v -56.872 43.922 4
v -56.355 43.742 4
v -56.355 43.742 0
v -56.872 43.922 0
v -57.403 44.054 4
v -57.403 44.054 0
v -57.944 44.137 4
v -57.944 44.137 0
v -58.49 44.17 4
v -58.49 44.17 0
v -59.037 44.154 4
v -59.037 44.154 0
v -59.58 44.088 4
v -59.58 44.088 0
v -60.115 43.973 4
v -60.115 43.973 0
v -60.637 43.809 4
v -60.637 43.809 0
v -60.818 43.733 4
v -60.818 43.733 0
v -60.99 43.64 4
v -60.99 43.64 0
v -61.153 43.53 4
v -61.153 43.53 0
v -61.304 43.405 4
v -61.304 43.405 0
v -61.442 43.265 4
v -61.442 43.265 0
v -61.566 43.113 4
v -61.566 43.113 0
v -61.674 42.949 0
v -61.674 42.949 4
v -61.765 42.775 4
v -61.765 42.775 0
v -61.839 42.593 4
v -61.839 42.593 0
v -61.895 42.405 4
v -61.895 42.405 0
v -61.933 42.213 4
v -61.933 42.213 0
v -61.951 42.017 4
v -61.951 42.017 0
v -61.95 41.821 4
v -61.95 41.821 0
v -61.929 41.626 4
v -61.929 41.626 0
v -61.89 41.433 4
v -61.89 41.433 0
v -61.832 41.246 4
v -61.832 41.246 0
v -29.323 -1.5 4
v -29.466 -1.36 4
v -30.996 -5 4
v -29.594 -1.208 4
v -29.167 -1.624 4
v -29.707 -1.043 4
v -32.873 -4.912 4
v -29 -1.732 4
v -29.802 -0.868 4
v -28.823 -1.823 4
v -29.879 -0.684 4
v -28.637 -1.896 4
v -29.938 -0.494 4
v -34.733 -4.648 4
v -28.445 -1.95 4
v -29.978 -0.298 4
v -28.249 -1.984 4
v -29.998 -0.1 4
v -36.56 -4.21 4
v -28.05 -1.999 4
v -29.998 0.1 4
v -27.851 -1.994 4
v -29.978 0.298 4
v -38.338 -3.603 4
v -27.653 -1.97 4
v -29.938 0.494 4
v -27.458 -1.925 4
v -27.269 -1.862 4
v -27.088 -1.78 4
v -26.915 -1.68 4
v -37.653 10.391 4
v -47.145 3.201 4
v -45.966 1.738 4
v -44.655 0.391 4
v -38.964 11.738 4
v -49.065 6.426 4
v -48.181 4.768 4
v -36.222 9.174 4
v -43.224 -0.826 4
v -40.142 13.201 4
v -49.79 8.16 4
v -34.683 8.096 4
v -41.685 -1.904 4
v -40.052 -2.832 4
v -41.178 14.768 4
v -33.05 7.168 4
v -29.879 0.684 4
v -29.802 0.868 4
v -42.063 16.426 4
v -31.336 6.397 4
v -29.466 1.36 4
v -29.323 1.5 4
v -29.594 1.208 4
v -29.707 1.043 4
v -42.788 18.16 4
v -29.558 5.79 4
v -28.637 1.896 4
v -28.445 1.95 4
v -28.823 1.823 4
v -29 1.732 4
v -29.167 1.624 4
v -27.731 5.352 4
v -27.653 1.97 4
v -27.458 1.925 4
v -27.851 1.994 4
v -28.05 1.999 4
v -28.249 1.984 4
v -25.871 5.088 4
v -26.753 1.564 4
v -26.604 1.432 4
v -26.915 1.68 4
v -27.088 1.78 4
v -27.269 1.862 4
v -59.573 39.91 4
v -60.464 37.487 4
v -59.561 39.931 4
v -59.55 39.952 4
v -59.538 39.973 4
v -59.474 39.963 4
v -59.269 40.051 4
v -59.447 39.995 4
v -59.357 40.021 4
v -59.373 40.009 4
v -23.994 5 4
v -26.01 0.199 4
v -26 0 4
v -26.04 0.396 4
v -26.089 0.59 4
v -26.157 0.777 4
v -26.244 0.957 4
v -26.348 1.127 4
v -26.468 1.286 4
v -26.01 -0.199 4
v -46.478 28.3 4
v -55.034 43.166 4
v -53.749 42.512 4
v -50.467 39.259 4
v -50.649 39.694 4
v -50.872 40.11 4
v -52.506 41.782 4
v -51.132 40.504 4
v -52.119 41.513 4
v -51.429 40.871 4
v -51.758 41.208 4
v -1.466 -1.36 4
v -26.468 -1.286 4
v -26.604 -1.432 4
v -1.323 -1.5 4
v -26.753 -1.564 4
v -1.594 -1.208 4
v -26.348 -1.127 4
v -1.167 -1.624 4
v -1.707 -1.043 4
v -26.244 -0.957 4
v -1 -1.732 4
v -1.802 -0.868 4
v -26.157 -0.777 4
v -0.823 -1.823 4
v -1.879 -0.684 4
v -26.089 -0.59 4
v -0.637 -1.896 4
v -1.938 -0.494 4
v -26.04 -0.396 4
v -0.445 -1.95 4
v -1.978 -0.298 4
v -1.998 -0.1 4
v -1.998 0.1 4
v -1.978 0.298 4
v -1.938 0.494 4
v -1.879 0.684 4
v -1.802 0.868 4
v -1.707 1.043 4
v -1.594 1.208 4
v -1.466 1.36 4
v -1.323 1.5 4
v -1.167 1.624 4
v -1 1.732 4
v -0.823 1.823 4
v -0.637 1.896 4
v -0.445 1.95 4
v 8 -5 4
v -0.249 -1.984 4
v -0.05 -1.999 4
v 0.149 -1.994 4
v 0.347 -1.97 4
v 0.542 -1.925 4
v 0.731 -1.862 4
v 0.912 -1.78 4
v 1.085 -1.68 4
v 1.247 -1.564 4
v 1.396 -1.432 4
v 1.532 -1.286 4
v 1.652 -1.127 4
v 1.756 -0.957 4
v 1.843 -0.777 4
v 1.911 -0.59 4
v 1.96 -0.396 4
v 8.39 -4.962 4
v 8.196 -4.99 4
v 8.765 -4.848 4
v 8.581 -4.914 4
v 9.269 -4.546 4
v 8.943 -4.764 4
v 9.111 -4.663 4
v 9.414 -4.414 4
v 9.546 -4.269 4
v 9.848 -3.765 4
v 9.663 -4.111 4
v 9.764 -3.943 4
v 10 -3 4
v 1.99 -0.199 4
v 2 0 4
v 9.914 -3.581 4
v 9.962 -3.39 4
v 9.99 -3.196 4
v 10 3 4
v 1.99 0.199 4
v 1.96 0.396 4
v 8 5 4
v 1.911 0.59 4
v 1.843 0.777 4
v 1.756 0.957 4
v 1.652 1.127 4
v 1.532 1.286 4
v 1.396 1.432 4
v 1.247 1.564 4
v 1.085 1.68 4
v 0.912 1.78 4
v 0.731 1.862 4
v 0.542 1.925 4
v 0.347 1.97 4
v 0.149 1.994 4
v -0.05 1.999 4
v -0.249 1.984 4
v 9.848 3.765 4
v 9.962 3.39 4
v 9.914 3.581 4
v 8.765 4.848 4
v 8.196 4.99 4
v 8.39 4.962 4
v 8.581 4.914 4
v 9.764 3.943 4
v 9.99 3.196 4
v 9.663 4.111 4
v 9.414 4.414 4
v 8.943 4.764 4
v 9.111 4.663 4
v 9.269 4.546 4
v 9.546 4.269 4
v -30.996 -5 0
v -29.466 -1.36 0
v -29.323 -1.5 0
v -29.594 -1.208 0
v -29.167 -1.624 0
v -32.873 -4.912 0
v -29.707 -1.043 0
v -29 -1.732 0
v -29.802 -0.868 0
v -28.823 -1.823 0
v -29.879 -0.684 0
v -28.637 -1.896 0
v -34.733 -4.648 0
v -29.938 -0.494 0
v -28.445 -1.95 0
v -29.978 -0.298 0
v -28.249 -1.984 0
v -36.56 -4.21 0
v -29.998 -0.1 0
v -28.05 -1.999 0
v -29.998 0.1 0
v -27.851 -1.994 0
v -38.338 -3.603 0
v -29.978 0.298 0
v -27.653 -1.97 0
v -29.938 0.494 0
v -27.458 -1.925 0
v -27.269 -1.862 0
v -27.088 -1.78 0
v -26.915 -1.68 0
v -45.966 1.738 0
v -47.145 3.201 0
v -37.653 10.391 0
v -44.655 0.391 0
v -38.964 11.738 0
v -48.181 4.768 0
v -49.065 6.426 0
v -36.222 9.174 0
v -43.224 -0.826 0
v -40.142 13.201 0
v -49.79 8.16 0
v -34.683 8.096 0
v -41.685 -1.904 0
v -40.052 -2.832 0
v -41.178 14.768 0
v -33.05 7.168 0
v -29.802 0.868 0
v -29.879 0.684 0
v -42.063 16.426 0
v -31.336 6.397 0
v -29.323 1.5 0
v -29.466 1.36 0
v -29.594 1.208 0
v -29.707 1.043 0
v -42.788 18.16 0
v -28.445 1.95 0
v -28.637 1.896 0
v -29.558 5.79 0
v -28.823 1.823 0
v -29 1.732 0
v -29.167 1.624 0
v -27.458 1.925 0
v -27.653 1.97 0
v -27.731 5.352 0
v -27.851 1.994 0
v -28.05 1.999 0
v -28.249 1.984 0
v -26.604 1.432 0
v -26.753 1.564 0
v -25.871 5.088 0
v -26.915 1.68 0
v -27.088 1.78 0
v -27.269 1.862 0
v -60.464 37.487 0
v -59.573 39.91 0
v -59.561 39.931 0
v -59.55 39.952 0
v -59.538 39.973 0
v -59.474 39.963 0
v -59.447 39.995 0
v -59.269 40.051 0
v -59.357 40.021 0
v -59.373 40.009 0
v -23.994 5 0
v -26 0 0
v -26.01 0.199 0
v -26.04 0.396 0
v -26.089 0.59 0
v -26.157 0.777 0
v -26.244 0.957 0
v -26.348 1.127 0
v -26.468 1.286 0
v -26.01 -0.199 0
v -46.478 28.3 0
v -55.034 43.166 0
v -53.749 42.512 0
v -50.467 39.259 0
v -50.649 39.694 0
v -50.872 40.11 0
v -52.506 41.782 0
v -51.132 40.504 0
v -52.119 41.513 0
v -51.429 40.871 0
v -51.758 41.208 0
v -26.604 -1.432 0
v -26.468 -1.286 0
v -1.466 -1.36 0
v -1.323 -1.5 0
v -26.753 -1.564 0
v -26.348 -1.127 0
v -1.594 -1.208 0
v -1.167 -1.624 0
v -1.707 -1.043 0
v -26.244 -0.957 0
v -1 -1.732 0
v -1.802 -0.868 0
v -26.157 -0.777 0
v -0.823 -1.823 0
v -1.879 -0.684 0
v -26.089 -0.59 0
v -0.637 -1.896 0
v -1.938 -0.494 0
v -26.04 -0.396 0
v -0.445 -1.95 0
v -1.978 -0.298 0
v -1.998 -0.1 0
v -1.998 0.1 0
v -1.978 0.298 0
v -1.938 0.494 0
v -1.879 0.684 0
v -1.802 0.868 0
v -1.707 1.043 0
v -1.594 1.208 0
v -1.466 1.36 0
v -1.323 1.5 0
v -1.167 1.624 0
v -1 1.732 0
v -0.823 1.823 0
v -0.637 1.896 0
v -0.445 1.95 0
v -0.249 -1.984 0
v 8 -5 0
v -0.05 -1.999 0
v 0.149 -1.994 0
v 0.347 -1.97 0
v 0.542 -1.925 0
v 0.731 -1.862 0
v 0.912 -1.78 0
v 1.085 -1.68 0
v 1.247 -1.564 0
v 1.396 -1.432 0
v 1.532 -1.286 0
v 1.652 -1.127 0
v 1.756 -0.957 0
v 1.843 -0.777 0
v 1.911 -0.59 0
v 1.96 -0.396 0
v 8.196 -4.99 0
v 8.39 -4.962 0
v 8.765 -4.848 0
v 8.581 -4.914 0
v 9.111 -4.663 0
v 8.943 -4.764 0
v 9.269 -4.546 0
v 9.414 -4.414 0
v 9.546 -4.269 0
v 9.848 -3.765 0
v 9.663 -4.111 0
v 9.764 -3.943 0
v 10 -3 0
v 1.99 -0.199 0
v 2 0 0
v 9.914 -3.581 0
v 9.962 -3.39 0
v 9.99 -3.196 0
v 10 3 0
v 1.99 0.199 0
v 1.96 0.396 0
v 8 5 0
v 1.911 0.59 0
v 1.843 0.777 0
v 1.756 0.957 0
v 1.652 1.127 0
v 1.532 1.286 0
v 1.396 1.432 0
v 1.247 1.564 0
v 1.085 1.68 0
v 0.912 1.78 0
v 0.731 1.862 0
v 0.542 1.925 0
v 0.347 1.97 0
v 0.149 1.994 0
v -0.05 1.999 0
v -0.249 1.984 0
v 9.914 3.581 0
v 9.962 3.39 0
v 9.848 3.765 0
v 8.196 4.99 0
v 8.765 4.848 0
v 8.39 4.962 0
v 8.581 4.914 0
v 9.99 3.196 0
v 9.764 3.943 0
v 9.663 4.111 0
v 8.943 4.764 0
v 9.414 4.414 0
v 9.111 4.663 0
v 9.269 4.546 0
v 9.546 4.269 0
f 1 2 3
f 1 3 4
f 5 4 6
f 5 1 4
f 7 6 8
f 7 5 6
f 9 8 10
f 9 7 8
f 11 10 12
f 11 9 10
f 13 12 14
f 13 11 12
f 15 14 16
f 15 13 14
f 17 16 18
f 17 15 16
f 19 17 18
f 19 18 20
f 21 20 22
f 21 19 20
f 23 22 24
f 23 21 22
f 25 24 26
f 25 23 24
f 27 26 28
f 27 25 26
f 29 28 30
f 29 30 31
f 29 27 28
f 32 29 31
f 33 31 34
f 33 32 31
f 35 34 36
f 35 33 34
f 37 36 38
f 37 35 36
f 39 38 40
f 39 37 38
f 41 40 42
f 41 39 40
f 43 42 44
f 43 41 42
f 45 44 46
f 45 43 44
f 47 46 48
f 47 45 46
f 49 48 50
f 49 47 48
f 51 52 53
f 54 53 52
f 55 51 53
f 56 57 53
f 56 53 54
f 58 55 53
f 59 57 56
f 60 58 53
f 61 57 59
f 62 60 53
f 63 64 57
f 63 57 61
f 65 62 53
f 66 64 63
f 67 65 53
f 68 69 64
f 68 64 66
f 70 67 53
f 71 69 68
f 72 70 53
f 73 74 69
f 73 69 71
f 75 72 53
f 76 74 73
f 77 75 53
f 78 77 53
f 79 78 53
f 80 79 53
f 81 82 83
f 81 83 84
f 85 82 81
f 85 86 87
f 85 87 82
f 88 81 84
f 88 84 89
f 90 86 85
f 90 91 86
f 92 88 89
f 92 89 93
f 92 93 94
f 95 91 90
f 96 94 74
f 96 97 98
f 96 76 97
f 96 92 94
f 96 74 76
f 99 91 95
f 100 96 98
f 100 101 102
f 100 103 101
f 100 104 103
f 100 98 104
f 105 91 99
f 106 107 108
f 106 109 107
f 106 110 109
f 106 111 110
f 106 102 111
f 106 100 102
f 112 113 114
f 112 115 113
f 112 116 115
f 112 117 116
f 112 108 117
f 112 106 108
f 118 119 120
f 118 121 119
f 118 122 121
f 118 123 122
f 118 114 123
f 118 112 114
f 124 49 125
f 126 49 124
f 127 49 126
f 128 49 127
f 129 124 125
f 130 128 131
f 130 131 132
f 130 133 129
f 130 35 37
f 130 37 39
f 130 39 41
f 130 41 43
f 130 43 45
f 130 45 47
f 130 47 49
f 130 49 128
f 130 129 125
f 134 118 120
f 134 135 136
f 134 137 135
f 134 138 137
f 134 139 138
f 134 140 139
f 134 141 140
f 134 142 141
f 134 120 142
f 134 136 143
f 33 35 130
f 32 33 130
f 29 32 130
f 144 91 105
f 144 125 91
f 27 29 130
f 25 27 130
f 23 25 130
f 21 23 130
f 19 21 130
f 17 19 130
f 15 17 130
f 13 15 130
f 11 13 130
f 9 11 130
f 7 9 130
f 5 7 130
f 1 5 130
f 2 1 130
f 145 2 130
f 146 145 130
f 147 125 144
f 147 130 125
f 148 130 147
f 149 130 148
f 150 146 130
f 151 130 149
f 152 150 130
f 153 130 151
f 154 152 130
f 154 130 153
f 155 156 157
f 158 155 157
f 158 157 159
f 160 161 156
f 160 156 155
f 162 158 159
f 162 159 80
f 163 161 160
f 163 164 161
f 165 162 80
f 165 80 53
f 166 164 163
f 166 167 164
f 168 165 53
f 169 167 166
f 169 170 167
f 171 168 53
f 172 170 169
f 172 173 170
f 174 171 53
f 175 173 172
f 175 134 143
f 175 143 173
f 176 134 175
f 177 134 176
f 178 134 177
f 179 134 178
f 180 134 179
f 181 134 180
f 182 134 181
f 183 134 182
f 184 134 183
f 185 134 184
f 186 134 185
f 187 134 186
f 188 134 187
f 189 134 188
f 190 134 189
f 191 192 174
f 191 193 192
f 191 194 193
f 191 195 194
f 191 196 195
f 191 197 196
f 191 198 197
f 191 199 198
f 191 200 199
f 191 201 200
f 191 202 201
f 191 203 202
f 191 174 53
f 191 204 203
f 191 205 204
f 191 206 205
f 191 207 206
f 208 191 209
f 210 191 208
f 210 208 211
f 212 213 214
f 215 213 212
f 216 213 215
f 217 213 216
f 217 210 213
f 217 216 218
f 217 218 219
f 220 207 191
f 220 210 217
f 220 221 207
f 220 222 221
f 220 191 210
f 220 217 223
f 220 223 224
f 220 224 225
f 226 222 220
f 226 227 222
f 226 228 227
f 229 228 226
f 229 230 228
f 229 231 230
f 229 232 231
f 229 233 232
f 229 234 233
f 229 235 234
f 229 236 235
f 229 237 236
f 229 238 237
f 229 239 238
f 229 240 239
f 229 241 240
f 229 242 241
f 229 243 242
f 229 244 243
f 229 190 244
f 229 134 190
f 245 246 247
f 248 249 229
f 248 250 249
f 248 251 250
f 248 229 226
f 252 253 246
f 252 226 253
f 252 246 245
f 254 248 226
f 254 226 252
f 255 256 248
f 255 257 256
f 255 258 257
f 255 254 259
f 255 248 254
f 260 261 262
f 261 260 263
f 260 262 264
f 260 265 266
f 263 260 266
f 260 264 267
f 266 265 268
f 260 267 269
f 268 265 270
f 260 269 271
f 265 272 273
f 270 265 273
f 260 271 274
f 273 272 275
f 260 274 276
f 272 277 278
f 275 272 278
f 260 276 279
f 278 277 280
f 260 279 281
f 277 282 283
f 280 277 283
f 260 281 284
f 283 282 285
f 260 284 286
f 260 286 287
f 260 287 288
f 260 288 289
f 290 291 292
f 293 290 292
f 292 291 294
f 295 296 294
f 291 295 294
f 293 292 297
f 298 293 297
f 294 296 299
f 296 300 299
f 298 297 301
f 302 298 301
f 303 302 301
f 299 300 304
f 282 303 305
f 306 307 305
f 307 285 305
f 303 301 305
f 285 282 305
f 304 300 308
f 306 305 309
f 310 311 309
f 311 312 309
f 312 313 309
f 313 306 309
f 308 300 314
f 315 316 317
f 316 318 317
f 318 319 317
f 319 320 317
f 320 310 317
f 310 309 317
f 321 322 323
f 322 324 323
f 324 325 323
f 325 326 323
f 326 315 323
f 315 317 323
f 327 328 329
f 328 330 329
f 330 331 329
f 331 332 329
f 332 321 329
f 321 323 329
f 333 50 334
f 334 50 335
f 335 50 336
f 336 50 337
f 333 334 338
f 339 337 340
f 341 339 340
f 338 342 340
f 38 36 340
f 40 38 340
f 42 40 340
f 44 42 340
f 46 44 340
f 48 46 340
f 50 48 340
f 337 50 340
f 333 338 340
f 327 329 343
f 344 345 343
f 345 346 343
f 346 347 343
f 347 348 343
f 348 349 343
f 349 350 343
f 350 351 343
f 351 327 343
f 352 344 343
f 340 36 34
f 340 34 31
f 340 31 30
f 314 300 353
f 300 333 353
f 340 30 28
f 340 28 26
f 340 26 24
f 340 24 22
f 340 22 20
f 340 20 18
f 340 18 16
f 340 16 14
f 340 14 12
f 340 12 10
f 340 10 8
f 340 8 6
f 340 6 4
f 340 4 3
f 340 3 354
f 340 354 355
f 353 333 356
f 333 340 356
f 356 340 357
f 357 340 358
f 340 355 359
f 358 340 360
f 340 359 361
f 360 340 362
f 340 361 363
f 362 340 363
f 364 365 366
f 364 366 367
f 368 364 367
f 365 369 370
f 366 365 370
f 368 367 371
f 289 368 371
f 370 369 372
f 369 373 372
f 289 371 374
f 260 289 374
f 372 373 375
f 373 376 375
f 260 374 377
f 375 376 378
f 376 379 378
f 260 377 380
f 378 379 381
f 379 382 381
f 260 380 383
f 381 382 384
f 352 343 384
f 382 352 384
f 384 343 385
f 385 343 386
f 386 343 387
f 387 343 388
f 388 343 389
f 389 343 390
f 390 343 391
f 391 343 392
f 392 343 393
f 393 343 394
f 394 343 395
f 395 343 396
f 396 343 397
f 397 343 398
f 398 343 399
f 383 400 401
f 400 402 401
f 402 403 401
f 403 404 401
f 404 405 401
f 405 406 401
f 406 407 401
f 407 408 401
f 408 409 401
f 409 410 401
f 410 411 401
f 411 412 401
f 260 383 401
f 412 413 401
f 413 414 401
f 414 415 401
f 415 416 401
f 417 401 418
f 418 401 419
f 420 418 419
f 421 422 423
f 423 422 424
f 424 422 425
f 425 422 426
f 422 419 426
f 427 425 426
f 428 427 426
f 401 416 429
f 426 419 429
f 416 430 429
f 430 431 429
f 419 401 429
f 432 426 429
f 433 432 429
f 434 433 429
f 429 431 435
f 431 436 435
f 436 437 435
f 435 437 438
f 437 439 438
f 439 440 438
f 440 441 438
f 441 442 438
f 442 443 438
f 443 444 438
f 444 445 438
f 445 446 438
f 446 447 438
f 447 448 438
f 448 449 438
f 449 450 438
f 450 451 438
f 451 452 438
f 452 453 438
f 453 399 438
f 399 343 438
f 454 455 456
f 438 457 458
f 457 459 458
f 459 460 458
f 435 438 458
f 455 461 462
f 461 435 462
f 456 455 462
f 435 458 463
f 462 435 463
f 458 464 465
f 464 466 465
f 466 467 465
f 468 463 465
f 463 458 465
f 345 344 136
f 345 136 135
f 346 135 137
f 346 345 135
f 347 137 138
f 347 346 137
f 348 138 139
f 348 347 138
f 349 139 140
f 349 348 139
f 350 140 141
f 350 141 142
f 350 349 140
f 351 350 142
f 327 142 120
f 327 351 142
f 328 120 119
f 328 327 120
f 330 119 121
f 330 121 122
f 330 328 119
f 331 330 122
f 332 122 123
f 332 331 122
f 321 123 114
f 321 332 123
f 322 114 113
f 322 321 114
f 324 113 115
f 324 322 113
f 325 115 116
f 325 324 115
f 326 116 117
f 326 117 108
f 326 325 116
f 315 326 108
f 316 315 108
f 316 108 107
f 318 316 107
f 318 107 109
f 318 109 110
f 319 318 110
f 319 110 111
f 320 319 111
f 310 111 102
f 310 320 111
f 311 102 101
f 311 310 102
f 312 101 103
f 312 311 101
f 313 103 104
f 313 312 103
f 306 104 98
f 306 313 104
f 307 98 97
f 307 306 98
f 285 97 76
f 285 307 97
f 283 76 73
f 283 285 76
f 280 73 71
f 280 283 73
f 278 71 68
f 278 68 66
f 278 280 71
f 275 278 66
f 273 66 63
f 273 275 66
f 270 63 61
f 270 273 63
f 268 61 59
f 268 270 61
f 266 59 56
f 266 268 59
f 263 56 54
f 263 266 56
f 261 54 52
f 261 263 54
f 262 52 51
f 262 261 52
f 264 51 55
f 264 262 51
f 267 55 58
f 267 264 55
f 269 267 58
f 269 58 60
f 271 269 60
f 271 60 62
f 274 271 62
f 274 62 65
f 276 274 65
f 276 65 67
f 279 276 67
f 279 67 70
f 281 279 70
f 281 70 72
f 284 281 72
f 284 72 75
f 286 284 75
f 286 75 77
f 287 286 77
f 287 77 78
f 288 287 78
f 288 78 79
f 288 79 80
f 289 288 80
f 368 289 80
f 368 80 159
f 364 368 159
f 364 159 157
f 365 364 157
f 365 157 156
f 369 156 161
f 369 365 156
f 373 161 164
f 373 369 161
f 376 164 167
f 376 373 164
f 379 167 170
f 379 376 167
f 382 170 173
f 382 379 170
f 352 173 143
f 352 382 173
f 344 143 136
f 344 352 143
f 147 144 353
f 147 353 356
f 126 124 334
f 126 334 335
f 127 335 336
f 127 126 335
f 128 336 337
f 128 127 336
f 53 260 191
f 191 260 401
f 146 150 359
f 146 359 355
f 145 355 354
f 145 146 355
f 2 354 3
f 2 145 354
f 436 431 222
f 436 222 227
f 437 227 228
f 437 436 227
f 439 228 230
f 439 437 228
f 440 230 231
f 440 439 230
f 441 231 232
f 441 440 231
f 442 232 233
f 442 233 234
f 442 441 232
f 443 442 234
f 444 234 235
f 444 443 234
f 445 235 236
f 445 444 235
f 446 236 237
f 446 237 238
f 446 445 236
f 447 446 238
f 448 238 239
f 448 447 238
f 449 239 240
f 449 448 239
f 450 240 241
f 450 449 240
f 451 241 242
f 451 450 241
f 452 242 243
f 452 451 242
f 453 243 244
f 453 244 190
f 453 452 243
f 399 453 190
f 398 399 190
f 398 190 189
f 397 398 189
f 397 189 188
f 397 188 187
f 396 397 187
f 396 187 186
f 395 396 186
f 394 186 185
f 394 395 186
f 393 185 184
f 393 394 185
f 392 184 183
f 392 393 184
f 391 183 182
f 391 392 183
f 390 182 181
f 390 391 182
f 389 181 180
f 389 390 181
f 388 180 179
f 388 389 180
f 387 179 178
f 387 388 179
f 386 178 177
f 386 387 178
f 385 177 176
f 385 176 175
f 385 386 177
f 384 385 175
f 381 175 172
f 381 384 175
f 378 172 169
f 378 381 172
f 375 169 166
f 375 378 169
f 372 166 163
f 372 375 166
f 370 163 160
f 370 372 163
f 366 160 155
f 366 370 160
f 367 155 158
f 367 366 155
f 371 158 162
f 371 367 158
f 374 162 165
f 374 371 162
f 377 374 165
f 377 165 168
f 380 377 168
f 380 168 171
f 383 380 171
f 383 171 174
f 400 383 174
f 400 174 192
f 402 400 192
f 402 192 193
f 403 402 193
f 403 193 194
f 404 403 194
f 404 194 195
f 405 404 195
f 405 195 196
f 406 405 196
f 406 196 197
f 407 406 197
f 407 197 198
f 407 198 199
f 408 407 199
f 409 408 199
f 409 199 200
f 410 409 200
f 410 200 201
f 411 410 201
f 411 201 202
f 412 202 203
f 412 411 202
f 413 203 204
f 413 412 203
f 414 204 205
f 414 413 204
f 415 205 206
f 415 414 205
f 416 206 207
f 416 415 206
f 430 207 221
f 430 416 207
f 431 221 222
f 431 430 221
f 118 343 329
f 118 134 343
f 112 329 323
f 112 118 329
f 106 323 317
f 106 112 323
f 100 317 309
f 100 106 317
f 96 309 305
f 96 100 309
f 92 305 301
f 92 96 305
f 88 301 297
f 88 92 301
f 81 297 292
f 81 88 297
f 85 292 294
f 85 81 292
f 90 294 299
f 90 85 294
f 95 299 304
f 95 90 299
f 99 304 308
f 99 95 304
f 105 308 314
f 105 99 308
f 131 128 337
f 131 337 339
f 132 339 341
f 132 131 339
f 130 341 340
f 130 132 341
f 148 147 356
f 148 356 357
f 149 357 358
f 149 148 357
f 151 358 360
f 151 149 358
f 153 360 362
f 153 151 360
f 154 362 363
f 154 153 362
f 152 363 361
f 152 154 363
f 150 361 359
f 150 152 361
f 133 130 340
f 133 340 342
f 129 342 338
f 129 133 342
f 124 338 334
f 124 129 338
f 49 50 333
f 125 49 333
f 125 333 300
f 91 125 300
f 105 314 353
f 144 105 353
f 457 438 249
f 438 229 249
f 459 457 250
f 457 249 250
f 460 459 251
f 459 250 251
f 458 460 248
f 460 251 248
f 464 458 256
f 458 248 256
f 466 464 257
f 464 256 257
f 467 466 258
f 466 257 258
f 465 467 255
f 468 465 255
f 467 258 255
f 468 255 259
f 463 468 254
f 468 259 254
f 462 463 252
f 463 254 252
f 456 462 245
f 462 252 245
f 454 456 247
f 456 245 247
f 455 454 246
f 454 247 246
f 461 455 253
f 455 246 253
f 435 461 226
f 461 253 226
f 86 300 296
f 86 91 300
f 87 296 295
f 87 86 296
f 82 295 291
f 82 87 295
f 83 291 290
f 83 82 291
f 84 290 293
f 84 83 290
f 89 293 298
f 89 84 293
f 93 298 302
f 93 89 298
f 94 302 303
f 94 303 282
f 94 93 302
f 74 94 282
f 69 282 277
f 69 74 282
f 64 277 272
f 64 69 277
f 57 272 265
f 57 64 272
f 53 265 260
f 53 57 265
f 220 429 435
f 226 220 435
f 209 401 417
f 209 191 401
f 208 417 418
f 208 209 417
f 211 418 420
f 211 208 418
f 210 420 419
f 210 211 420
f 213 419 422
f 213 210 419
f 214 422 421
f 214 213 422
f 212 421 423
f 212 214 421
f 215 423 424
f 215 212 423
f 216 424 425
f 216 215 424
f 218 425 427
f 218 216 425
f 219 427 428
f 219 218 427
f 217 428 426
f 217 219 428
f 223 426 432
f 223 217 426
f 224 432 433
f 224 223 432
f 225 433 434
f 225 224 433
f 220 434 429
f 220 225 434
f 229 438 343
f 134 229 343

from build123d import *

# Parameters (mm, degrees)
SKETCH_1_W      = 50
SKETCH_1_H      = 10
SKETCH_1_R      = 2
SKETCH_1_W_2    = 5
EXTRUDE_1_DEPTH = 4
FILLET_1_R      = 20
FILLET_2_R      = 20
FILLET_3_R      = 2
EXTRUDE_2_DEPTH = 4


with BuildPart() as part:
    # 草图1 → 凸台-拉伸1 (new body)
    with BuildSketch(Plane.XY):
        Polygon((-49.968629634, 37.889241728), (-61.844641091, 41.280271037), (-45, -5), (-45, 5), (-37.997924618, 5), align=None)
        with Locations((-20, 0)):
            Rectangle(SKETCH_1_W, SKETCH_1_H)
        with Locations((-28, 0)):
            Circle(SKETCH_1_R, mode=Mode.SUBTRACT)
        Circle(SKETCH_1_R, mode=Mode.SUBTRACT)
        with Locations((7.5, 0)):
            Rectangle(SKETCH_1_W_2, SKETCH_1_H)
    extrude(amount=EXTRUDE_1_DEPTH)

    # 圆角1
    fillet_1_edges = [part.edges().sort_by_distance(p)[0] for p in [
        (-37.997924618, 5, 2),
        (-45, -5, 2),
    ]]
    fillet(fillet_1_edges, radius=FILLET_1_R)

    # 圆角2
    fillet_2_edges = [part.edges().sort_by_distance(p)[0] for p in [
        (-49.968629634, 37.889241728, 2),
    ]]
    fillet(fillet_2_edges, radius=FILLET_2_R)

    # 圆角3
    fillet_3_edges = [part.edges().sort_by_distance(p)[0] for p in [
        (-61.844641091, 41.280271037, 2),
        (10, -5, 2),
        (10, 5, 2),
    ]]
    fillet(fillet_3_edges, radius=FILLET_3_R)

    # 草图2 → 凸台-拉伸2 (add)
    with BuildSketch(Plane.XY.offset(4)):
        with BuildLine():
            ThreePointArc((-56.355465994, 43.741712807), (-58.489892138, 44.170450367), (-60.636797067, 43.809354689))
            ThreePointArc((-60.636797067, 43.809354689), (-61.765372114, 42.775205935), (-61.832141712, 41.245929274))
            Line((-61.832141712, 41.245929274), (-60.464061138, 37.487158791))
            ThreePointArc((-60.464061138, 37.487158791), (-60.461686369, 38.861729082), (-59.572682652, 39.910119045))
            ThreePointArc((-59.572682652, 39.910119045), (-59.555544901, 39.941826673), (-59.538179031, 39.973409941))
            ThreePointArc((-59.538179031, 39.973409941), (-59.402093878, 40.007270752), (-59.26871602, 40.050584379))
            ThreePointArc((-59.26871602, 40.050584379), (-58.553081169, 40.170949505), (-57.841605929, 40.028036987))
            ThreePointArc((-57.841605929, 40.028036987), (-50.908526864, 35.37662093), (-46.47845319, 28.300060756))
            Line((-46.47845319, 28.300060756), (-50.467059195, 39.258665691))
            ThreePointArc((-50.467059195, 39.258665691), (-51.276051122, 40.690541098), (-52.50584262, 41.782487979))
            ThreePointArc((-52.50584262, 41.782487979), (-54.386487154, 42.848883136), (-56.355465994, 43.741712807))
        make_face()
    extrude(amount=-EXTRUDE_2_DEPTH)


solid = part.part
